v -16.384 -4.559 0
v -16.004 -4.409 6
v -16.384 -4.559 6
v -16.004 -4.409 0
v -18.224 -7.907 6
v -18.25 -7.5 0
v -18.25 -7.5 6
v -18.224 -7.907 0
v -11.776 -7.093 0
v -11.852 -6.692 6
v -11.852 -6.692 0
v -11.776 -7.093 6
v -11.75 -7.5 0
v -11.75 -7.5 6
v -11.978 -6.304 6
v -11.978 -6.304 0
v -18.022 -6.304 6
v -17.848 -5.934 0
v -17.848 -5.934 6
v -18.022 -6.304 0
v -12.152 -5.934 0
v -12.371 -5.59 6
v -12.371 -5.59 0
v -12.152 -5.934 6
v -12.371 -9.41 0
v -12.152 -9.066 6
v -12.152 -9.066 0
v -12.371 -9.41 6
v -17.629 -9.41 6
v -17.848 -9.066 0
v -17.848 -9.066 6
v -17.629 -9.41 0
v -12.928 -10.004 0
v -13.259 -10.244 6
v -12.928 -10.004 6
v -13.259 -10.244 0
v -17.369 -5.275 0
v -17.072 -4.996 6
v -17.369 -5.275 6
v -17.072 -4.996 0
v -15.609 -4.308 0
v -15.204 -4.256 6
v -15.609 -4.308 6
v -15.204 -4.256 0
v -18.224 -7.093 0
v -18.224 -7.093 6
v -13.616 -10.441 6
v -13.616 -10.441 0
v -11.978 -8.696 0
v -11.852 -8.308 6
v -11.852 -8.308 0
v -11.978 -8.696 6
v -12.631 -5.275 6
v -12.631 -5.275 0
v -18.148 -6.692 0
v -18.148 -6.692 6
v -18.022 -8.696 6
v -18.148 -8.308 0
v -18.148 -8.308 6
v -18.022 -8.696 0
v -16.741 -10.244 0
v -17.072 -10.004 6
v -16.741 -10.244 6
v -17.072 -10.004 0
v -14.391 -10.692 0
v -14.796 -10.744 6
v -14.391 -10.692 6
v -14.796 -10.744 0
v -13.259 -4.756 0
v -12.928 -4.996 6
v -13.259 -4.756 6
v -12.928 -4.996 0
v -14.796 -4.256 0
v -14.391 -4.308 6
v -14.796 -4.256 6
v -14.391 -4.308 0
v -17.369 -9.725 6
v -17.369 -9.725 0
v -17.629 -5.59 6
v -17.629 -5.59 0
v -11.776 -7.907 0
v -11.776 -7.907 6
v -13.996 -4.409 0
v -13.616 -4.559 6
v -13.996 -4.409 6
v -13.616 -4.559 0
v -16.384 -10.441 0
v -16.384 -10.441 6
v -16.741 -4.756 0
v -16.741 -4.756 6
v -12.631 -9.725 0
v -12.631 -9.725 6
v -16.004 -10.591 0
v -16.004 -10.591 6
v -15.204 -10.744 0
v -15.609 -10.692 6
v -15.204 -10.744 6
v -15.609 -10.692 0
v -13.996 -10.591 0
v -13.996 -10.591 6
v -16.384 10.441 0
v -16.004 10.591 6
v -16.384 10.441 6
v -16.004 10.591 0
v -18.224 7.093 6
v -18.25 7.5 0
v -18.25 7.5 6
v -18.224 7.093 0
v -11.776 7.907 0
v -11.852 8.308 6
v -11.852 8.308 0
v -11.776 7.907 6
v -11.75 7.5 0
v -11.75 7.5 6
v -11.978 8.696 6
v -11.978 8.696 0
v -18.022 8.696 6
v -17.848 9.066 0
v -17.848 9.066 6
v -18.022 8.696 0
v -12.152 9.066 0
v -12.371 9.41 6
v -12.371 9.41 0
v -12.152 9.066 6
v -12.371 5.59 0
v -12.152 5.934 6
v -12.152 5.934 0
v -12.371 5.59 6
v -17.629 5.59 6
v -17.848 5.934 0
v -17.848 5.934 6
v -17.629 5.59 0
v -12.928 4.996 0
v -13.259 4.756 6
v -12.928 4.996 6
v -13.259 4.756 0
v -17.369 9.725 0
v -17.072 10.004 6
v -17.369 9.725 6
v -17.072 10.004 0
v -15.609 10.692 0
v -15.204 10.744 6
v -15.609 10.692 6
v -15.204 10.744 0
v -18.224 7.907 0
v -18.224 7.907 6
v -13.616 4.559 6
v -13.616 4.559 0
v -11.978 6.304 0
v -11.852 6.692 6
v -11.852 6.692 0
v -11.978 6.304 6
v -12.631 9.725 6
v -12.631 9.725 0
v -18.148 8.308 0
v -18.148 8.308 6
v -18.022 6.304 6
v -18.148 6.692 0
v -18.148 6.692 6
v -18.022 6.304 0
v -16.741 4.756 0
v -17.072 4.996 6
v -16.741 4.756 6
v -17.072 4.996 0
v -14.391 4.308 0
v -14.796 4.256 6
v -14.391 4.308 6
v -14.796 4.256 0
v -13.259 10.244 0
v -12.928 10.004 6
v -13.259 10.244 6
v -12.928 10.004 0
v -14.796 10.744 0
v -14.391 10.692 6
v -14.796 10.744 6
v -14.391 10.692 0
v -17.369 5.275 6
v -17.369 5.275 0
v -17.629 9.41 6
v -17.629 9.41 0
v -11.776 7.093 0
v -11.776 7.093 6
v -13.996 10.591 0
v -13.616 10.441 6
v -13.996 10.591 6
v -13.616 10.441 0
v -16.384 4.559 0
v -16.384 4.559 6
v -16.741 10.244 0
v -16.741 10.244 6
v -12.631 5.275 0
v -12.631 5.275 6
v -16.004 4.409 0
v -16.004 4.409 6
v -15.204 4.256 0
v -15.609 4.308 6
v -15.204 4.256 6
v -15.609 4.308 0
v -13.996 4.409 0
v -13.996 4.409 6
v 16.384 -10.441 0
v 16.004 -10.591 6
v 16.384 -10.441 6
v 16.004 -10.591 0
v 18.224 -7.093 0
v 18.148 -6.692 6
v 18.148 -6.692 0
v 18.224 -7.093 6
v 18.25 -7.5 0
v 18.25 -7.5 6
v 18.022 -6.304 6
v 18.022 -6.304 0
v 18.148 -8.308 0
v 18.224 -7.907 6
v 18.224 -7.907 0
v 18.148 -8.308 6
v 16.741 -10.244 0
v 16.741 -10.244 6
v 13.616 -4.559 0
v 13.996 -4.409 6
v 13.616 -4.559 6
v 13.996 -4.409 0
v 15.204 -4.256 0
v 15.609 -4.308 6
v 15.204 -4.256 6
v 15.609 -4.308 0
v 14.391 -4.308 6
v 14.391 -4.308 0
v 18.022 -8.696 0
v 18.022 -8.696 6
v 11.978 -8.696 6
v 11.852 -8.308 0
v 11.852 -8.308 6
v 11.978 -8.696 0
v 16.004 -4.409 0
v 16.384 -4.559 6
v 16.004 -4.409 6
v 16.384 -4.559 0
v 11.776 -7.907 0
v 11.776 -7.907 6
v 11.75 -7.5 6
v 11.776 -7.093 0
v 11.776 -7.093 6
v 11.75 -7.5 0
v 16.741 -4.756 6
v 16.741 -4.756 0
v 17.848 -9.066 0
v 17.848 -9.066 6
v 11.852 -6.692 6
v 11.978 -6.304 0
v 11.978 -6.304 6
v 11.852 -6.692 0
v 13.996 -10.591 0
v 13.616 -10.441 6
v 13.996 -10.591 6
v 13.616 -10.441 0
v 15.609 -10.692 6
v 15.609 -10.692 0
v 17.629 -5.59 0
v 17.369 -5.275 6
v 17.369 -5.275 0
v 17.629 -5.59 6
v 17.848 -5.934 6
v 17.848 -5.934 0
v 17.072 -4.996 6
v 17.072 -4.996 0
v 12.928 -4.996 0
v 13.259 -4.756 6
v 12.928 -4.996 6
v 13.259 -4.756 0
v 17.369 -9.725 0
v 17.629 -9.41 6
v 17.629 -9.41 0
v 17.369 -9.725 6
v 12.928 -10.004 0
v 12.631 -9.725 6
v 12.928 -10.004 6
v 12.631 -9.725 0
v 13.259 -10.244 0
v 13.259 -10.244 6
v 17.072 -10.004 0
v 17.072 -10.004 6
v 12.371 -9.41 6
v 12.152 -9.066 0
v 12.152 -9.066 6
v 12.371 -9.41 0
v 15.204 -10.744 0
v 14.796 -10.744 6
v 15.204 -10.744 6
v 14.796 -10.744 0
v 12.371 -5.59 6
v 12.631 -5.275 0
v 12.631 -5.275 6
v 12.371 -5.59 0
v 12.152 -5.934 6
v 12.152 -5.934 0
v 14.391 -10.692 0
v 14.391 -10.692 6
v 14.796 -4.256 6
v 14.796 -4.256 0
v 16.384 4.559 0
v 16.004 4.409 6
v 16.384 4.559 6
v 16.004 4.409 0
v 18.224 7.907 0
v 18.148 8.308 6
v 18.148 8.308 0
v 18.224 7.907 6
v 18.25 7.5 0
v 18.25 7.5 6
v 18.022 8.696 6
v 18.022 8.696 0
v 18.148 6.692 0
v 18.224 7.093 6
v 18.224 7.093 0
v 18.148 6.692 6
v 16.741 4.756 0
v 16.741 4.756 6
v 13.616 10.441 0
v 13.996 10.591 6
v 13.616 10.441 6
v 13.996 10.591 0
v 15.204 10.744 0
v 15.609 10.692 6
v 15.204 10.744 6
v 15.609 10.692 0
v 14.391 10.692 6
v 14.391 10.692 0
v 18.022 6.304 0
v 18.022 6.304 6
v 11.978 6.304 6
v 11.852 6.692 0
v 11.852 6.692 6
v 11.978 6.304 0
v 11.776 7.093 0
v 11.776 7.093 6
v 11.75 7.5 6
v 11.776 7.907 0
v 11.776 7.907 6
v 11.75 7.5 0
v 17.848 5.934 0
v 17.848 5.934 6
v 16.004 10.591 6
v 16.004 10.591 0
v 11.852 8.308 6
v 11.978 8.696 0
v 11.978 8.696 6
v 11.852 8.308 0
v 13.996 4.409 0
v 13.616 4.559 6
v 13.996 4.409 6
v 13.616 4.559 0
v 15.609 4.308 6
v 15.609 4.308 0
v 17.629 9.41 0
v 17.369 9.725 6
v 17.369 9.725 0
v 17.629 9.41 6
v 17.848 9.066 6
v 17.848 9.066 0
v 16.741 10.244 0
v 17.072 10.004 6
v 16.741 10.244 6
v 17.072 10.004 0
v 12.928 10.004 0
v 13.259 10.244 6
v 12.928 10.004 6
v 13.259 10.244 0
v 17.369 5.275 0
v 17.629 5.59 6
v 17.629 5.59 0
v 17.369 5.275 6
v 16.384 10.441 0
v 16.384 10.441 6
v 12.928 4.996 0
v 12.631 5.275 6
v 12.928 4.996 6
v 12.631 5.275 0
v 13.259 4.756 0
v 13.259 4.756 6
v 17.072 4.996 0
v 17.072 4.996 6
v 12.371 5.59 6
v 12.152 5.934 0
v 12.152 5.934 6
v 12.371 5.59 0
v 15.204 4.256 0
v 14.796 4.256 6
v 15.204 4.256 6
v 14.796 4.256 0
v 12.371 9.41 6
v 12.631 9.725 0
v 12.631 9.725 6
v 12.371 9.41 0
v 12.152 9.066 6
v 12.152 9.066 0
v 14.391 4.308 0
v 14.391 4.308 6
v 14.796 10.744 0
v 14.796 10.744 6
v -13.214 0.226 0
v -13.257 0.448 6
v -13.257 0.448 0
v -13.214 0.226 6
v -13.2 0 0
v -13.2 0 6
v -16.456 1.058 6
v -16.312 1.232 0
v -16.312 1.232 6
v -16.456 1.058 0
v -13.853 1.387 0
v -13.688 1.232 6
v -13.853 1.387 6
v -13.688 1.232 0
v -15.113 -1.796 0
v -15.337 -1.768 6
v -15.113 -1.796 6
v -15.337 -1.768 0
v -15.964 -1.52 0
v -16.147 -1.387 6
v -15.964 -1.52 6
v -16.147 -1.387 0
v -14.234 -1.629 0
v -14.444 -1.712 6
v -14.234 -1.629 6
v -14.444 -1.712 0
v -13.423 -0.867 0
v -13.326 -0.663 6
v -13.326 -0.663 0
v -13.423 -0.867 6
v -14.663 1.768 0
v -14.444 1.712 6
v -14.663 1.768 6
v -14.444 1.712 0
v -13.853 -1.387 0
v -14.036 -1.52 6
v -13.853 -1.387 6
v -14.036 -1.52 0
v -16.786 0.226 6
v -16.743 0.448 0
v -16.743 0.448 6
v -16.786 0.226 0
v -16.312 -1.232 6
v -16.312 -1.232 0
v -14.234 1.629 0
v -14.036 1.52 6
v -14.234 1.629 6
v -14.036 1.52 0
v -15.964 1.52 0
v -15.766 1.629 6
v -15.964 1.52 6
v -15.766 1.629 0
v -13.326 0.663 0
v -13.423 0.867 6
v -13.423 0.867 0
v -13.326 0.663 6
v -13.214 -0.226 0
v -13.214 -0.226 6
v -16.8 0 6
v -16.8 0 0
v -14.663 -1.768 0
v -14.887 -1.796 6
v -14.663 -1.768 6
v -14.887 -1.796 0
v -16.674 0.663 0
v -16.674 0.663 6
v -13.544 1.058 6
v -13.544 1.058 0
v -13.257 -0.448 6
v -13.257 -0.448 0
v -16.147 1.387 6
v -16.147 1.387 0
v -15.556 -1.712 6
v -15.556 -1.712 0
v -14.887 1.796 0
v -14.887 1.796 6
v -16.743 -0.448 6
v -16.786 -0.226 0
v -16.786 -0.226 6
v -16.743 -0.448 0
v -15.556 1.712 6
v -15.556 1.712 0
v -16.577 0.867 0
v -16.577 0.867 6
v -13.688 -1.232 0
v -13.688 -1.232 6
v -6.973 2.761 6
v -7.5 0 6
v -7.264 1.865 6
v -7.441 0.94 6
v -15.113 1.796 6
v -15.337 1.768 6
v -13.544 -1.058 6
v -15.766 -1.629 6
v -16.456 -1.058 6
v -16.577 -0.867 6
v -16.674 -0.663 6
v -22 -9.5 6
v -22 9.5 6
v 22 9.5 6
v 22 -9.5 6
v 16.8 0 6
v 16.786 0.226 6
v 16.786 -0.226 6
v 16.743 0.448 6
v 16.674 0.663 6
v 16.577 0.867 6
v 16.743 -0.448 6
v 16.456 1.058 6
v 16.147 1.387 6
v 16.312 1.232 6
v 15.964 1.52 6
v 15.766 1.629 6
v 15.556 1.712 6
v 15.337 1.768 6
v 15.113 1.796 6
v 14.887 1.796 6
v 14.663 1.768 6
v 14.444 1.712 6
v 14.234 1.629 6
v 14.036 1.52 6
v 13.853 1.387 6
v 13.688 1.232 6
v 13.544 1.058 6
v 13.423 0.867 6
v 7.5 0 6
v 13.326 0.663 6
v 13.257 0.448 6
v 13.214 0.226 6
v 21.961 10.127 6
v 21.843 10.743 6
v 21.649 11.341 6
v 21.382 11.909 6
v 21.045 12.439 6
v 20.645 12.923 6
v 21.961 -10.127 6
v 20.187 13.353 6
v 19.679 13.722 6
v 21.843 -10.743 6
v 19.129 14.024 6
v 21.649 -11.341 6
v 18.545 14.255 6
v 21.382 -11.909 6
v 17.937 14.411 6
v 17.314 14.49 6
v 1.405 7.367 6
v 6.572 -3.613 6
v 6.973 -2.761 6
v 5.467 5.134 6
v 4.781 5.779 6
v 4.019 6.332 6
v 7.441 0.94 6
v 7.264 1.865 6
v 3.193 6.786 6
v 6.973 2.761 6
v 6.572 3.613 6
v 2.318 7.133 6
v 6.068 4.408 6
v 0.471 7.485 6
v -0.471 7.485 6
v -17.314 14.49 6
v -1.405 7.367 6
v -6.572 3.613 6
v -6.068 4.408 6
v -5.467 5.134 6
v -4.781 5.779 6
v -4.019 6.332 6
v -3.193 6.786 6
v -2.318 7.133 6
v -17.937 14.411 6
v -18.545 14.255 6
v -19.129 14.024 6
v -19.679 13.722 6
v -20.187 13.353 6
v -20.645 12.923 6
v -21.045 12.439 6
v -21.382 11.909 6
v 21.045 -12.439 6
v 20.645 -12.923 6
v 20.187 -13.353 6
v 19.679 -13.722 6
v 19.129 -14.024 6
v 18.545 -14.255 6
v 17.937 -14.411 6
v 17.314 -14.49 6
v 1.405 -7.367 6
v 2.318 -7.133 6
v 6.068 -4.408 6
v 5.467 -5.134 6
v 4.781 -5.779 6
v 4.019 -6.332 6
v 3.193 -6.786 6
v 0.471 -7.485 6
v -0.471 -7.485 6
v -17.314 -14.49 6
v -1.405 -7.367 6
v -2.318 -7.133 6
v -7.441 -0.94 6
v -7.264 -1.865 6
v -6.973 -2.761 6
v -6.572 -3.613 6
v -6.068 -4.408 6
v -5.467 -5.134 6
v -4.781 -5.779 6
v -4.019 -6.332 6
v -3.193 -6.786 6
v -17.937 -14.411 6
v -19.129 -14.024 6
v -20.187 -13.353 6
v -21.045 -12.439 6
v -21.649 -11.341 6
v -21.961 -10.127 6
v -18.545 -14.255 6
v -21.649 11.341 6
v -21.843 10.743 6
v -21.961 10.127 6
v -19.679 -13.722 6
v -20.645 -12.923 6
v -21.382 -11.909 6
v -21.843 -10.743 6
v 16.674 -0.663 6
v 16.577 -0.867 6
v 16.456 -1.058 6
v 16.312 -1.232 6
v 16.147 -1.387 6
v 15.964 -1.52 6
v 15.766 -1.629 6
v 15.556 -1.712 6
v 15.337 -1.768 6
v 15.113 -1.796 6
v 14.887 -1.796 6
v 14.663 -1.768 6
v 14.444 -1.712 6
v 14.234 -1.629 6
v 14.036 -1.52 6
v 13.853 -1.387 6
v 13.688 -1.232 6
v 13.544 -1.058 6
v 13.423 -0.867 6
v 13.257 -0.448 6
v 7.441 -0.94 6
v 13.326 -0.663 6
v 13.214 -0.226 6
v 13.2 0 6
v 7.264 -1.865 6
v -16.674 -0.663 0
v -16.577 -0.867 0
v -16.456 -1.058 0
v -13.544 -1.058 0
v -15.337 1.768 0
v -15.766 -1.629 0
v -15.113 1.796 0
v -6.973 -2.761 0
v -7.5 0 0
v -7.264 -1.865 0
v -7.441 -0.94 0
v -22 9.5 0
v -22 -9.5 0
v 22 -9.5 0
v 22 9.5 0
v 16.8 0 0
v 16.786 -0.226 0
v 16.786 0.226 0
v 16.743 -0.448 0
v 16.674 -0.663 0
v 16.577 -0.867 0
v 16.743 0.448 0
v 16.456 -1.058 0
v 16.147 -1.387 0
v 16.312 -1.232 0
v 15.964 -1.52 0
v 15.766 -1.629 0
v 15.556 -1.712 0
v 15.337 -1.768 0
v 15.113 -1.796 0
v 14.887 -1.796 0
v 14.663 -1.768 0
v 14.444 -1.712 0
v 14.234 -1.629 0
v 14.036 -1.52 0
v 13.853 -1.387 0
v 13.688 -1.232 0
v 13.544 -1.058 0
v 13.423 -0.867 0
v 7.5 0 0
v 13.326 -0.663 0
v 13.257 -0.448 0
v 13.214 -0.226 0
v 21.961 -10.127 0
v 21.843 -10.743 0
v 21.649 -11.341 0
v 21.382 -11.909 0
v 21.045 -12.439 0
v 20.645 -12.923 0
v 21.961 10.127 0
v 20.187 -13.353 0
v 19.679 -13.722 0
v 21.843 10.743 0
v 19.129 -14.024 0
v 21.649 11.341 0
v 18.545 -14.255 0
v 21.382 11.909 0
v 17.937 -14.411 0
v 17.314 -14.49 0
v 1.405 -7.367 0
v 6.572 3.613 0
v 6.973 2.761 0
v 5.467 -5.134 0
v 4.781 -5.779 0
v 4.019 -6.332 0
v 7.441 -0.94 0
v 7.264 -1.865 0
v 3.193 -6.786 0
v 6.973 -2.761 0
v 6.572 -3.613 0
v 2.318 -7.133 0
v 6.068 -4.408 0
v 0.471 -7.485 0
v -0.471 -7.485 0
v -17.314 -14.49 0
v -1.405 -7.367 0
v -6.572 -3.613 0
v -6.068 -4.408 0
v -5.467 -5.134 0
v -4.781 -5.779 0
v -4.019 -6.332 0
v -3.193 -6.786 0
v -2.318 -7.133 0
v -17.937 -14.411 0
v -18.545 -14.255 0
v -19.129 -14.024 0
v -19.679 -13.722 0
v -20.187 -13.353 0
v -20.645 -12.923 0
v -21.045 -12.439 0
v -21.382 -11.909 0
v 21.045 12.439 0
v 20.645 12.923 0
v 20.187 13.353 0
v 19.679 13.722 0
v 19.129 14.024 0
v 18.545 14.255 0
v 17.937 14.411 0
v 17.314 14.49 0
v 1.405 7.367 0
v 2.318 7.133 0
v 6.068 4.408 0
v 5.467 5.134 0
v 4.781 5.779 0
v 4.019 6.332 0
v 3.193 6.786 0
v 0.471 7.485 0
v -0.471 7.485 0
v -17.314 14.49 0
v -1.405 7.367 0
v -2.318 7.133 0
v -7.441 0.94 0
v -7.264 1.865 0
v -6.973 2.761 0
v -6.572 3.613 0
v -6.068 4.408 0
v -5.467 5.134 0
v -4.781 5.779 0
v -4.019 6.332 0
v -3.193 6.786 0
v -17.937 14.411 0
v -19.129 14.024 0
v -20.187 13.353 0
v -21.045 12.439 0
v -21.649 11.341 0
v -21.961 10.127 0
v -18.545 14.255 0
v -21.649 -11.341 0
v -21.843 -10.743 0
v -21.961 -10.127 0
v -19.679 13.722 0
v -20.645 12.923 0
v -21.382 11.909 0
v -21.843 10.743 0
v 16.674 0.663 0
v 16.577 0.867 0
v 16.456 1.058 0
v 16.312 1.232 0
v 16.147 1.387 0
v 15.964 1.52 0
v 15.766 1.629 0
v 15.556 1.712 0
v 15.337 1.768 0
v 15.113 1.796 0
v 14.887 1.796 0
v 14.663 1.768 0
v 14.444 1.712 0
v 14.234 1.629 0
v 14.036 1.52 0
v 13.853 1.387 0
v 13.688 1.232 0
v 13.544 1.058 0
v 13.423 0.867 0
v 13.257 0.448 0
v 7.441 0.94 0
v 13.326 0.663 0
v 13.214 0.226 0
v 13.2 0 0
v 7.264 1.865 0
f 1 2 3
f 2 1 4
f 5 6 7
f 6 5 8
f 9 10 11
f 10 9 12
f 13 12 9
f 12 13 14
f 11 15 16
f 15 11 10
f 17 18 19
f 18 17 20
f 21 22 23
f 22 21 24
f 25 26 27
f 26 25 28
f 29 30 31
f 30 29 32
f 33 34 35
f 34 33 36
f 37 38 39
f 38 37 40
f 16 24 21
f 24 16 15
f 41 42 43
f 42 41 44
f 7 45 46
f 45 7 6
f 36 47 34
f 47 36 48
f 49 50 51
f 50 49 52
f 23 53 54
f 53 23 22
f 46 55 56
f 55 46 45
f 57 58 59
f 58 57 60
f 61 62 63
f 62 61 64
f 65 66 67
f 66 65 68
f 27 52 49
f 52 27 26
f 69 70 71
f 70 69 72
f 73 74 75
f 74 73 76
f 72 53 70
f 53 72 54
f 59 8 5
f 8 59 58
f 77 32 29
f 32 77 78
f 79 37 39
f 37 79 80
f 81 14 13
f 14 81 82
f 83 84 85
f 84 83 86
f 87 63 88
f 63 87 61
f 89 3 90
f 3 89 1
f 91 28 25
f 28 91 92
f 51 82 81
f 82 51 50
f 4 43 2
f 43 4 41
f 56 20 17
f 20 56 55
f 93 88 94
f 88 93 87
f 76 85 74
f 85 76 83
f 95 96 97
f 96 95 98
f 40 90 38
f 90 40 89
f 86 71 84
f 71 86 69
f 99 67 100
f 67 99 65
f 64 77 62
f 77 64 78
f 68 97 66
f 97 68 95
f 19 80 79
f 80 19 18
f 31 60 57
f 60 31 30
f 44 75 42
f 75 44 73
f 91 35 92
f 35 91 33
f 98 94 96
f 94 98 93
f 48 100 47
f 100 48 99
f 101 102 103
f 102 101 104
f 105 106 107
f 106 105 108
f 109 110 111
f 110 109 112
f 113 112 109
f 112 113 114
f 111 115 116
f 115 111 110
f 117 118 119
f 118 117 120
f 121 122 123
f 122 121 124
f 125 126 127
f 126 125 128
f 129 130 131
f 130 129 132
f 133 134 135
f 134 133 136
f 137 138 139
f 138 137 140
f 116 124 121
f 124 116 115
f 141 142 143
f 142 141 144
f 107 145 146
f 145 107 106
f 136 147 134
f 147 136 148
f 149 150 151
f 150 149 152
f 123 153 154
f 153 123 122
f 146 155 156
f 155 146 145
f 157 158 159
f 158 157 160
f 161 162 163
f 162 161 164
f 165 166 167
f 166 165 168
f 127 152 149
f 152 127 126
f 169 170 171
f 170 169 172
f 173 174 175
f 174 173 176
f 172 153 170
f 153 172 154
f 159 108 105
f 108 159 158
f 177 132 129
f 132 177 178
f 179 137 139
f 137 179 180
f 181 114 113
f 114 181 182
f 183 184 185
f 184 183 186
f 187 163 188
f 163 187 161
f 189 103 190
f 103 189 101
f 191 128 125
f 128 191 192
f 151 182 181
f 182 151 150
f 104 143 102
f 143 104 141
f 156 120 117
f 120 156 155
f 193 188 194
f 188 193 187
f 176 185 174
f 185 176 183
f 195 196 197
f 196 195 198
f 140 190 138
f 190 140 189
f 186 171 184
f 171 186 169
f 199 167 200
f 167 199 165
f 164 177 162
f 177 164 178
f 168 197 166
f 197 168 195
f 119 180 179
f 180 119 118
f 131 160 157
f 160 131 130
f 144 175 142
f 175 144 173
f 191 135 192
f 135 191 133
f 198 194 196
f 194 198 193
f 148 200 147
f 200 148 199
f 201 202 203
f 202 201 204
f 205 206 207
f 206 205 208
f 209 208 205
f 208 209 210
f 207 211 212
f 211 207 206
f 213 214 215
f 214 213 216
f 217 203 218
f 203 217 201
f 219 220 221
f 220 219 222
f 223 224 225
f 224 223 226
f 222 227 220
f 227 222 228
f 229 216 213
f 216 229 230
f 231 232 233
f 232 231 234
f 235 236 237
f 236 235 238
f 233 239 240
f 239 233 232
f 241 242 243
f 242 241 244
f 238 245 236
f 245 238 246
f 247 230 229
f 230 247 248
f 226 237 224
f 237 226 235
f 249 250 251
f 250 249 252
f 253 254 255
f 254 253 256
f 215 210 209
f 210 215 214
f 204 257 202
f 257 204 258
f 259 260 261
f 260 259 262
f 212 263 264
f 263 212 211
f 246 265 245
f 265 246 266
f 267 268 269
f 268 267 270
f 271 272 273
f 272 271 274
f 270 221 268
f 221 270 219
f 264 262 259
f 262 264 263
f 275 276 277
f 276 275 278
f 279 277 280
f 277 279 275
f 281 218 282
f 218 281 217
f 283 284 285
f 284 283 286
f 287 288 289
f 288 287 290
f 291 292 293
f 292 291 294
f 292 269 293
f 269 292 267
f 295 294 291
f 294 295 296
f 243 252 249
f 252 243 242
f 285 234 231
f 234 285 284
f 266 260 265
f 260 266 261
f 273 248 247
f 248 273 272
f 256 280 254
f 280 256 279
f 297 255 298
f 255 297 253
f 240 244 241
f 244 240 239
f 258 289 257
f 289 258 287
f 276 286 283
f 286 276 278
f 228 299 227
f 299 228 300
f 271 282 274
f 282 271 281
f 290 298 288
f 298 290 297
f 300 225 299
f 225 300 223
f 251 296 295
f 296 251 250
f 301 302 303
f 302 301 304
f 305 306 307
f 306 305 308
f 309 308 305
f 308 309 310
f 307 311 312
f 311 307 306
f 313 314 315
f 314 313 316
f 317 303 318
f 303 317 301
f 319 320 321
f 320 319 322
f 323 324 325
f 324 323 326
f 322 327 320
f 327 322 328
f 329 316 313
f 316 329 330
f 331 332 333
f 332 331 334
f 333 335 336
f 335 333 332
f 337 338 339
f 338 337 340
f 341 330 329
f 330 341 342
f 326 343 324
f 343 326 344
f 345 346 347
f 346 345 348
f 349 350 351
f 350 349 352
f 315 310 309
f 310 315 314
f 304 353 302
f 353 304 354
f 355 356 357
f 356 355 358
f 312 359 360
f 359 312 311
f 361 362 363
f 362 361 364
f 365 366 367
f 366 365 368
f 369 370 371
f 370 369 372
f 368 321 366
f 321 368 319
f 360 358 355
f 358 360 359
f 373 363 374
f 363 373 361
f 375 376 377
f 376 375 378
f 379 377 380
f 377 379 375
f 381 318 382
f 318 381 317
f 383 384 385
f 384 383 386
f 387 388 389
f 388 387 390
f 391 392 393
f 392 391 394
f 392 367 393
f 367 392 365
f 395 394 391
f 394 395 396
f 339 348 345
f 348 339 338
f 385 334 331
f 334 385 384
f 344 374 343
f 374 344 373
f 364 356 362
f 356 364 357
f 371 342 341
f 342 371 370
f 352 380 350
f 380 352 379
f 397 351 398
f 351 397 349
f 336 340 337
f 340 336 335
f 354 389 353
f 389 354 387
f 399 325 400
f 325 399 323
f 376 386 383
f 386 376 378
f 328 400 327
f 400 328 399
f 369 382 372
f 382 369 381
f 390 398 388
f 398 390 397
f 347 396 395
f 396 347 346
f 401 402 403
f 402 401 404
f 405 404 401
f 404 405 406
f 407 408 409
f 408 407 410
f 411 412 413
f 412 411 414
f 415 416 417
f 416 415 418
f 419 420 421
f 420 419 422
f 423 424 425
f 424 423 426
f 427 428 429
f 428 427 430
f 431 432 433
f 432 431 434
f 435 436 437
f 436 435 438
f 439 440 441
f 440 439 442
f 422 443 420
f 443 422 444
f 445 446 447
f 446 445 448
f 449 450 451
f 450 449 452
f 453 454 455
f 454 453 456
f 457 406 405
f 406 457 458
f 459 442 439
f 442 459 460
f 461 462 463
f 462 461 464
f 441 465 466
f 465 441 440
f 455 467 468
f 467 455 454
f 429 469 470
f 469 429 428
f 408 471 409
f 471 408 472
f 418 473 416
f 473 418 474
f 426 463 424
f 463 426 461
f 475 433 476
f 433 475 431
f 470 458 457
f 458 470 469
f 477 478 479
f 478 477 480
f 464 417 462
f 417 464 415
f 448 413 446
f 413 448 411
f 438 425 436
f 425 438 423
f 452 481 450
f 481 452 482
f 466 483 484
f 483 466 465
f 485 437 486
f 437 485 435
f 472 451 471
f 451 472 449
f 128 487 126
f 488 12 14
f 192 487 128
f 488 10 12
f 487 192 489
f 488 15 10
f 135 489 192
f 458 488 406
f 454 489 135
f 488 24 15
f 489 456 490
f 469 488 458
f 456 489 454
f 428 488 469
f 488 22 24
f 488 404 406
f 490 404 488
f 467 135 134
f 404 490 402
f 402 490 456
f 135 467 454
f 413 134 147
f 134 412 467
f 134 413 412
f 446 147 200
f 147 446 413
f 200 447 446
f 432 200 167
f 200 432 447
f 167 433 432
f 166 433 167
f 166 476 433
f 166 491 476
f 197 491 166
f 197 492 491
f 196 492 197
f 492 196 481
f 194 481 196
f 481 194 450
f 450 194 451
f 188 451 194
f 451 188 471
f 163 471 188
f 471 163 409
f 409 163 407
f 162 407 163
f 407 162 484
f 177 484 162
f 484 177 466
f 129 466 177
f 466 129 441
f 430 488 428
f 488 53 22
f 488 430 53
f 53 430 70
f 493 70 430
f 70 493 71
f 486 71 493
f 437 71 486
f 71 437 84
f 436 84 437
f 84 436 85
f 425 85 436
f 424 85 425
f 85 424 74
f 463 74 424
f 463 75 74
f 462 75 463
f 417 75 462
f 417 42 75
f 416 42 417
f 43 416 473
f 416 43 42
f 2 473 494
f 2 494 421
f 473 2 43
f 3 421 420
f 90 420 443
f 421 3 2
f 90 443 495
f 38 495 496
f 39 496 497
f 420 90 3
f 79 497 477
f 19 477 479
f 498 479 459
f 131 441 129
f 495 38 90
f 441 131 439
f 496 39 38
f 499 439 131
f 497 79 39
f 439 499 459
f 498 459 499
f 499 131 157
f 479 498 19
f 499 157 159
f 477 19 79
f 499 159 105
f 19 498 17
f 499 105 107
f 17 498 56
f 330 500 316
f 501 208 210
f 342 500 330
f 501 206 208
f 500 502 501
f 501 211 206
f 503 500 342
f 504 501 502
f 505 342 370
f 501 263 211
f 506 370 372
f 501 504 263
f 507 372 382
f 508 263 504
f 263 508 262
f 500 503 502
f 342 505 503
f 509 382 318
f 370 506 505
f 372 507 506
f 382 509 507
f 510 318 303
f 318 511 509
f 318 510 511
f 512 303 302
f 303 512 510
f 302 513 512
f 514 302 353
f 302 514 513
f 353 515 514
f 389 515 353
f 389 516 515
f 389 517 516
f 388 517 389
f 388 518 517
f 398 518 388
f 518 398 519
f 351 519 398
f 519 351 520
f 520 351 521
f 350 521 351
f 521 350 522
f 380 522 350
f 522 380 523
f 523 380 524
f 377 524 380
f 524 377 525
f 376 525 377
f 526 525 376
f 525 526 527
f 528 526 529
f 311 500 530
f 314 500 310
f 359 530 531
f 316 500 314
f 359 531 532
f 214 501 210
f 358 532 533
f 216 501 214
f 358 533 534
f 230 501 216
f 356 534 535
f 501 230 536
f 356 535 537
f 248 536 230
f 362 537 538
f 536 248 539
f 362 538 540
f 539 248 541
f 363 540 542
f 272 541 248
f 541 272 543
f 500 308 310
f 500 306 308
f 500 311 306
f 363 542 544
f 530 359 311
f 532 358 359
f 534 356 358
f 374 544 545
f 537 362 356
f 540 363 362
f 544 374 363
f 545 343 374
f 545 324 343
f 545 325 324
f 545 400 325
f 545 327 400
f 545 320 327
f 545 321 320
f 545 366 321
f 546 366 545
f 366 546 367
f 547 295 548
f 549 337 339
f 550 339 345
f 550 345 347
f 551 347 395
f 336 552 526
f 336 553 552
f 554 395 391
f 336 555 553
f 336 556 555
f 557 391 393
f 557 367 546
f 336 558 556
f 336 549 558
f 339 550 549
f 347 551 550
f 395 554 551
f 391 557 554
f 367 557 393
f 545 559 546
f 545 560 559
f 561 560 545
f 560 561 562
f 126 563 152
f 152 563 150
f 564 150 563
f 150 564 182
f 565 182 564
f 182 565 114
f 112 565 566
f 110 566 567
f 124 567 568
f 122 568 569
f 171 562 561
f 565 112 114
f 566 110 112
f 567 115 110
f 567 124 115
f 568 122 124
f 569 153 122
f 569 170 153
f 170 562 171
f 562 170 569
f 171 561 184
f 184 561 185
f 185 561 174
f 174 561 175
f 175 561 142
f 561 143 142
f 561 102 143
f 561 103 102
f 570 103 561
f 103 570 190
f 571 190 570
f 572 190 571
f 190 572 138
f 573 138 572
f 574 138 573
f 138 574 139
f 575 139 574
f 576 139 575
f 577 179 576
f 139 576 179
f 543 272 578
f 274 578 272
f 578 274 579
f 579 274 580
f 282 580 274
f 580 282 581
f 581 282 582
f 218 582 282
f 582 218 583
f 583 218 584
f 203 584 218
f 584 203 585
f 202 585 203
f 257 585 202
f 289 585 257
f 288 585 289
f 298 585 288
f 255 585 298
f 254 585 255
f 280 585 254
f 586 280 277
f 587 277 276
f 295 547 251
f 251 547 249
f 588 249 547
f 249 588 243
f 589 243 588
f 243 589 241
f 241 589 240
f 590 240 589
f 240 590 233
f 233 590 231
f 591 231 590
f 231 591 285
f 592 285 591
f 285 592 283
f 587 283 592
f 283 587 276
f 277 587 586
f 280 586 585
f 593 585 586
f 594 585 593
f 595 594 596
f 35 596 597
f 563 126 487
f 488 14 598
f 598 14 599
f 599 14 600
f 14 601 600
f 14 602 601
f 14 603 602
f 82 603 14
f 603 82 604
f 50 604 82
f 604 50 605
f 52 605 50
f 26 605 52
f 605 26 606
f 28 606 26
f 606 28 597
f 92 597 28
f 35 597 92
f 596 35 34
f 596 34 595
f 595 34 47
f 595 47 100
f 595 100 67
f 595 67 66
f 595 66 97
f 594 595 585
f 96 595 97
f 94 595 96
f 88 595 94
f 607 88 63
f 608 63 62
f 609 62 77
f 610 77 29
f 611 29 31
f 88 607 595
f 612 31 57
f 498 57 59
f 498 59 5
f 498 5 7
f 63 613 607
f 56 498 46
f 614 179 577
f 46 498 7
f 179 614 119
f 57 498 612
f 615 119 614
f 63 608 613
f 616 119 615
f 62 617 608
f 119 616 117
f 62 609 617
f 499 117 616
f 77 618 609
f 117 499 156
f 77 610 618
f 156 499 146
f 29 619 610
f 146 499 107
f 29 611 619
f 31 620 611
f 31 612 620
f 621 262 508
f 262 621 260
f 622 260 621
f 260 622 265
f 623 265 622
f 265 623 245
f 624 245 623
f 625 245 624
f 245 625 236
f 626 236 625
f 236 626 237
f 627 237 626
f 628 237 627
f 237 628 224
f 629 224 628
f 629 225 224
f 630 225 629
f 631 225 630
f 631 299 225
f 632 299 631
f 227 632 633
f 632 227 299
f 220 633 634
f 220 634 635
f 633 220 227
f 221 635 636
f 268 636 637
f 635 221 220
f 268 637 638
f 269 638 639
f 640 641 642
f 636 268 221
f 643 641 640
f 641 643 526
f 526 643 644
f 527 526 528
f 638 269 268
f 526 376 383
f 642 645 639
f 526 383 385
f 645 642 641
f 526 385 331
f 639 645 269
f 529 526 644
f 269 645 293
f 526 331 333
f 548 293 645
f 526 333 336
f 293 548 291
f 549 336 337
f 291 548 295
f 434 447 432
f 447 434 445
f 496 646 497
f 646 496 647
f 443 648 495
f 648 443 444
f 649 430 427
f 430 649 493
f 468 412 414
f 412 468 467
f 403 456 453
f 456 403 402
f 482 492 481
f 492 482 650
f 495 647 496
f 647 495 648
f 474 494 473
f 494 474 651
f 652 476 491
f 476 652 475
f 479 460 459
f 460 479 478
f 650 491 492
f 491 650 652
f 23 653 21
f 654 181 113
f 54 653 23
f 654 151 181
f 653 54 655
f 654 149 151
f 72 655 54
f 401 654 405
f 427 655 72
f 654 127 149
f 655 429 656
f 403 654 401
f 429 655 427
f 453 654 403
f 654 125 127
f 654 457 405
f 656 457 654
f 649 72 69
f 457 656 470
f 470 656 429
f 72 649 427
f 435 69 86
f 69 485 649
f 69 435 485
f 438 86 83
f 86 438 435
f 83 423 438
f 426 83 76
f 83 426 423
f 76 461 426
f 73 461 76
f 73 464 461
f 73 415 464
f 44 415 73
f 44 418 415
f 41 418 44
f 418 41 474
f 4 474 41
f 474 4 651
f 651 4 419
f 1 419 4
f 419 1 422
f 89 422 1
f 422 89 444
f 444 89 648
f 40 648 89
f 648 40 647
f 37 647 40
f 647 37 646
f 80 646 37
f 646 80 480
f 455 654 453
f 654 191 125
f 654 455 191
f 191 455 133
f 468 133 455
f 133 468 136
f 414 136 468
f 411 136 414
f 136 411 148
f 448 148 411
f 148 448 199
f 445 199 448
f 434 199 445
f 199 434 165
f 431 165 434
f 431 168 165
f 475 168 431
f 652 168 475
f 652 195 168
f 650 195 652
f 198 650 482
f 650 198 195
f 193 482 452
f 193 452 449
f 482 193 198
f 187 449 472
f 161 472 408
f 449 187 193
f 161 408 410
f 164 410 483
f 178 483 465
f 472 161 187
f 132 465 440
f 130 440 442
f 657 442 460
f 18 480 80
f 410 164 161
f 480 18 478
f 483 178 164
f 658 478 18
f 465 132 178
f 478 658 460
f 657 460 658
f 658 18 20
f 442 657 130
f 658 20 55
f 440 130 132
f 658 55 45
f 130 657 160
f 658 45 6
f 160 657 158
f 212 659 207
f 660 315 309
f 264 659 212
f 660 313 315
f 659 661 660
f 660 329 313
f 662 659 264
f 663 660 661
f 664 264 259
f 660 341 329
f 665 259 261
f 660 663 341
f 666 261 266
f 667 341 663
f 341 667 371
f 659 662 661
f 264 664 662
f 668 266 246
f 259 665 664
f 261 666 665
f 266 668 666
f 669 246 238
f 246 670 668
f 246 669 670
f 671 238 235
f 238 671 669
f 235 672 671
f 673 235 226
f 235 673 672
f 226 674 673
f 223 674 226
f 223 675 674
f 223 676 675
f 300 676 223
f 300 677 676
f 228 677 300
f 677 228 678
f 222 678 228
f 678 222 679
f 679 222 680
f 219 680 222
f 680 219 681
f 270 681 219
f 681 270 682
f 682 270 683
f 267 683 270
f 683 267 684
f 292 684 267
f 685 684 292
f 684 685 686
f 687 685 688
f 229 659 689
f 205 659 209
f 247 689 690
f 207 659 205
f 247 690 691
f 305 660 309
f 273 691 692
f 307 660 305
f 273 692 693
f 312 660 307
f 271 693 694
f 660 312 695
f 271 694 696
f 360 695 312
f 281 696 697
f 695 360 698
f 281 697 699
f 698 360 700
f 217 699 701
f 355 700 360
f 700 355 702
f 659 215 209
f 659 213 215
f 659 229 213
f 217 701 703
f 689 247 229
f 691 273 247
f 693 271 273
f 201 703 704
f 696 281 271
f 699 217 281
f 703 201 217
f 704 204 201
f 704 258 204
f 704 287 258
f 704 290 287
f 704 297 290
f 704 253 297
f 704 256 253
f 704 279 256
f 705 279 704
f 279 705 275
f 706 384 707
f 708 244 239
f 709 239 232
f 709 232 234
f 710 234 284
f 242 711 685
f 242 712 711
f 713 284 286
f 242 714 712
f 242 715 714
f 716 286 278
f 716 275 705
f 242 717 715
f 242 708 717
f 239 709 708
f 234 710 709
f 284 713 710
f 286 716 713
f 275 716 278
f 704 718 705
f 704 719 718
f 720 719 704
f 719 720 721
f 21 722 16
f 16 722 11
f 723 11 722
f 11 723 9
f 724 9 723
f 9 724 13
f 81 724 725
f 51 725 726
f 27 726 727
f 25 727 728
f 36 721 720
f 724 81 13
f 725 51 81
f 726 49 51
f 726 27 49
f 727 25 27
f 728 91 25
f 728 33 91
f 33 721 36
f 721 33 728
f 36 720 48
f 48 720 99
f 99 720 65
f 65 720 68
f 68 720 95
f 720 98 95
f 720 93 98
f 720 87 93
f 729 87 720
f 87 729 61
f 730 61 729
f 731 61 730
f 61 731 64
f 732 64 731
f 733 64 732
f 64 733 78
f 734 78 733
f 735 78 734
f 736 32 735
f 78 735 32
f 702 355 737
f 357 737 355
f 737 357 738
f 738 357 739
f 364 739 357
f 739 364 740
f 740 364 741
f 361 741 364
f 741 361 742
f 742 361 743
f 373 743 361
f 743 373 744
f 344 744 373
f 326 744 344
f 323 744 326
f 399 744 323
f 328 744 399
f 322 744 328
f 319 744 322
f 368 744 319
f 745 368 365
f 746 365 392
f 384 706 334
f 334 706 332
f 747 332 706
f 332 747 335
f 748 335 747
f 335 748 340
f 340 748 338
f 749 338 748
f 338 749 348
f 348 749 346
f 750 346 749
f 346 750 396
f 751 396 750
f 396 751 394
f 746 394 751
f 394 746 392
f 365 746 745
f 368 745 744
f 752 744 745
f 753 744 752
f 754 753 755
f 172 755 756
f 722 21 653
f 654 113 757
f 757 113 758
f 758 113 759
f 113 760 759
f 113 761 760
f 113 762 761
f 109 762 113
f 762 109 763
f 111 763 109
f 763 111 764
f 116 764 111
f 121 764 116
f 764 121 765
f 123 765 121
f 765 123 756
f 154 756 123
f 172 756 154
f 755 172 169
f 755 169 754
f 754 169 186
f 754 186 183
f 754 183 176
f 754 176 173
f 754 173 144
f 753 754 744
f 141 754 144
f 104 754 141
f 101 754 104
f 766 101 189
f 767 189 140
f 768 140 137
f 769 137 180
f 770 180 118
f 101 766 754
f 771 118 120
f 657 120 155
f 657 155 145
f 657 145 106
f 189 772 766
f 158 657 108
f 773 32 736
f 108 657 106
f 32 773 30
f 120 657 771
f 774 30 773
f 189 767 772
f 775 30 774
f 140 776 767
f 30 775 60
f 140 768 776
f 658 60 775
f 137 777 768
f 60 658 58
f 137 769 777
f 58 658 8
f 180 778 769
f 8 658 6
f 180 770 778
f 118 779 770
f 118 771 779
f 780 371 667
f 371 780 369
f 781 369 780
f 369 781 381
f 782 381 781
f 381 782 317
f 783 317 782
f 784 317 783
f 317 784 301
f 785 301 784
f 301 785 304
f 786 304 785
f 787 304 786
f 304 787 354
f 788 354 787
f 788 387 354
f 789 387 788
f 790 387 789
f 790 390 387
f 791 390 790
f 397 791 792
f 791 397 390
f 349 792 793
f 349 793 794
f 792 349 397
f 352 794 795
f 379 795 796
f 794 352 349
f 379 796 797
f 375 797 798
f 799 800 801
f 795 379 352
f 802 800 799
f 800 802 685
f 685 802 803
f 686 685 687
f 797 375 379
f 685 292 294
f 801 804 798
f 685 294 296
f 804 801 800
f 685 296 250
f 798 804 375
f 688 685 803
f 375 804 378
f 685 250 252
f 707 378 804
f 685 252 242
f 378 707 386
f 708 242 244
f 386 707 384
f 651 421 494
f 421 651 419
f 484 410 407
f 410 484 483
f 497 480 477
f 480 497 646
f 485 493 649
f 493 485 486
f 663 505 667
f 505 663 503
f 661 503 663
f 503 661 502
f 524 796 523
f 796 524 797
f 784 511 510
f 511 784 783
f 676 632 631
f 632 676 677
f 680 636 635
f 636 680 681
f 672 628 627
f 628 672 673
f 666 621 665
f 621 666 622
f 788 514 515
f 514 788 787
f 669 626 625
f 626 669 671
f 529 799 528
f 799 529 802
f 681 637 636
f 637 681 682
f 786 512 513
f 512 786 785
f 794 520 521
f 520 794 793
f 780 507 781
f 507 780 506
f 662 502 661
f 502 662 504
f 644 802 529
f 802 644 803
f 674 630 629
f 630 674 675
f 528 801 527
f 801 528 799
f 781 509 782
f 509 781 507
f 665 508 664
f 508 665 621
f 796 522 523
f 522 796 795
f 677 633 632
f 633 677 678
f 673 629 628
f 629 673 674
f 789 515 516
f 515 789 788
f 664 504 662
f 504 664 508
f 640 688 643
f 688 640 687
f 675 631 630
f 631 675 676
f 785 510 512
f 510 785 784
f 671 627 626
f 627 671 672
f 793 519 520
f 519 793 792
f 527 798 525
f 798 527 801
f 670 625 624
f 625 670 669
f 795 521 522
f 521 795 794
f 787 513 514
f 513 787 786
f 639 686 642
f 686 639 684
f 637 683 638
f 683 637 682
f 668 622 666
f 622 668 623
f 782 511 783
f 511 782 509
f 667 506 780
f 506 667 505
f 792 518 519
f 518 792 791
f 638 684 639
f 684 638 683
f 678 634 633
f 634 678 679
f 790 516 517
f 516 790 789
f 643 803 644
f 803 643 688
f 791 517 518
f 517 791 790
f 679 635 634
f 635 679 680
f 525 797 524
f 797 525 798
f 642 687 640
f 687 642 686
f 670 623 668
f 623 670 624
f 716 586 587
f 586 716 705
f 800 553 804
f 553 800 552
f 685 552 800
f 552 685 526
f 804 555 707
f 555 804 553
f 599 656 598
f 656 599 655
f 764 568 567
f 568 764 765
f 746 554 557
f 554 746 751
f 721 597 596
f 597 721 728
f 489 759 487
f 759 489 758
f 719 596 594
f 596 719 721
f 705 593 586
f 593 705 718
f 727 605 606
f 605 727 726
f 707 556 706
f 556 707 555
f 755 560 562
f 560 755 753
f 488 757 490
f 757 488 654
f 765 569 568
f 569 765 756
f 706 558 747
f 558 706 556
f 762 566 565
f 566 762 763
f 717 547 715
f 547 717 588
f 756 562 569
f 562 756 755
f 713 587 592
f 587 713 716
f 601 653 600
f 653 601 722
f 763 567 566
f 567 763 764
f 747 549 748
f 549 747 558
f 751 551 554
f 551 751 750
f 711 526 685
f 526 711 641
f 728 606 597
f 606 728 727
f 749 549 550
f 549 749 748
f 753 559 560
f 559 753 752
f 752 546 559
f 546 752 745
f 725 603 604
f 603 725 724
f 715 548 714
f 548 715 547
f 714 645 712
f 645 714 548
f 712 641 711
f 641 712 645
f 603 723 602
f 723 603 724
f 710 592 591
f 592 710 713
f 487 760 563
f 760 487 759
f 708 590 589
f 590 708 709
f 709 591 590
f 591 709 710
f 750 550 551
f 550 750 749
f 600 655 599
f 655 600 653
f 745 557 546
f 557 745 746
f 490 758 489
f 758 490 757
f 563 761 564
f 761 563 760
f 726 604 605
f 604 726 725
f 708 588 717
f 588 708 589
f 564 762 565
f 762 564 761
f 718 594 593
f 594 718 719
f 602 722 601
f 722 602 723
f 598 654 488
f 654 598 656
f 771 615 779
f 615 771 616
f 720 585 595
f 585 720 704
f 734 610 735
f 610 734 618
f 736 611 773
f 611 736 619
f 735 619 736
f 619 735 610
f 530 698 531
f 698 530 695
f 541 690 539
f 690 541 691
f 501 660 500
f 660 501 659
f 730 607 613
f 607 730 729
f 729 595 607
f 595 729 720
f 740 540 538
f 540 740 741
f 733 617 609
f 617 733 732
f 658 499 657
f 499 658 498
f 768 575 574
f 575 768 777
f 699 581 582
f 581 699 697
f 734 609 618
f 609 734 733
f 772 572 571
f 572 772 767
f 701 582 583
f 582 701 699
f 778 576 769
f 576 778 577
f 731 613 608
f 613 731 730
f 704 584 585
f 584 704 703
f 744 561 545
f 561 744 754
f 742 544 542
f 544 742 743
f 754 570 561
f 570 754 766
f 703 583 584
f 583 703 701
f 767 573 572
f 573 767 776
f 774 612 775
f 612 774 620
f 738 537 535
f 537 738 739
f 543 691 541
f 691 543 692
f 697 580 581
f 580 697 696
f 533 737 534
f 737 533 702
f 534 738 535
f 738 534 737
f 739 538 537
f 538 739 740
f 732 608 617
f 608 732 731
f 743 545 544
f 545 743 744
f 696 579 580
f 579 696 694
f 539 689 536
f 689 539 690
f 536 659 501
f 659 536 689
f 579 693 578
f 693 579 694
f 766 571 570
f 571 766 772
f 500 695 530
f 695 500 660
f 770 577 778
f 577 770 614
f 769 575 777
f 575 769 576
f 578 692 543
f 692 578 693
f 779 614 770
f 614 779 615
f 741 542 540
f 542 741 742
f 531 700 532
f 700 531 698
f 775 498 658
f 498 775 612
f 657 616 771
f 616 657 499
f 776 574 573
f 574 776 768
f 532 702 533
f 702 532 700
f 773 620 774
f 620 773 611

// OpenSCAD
$fn = 50;


difference() {
	union() {
		hull() {
			translate(v = [-17.0000000000, 9.5000000000, 0]) {
				cylinder(h = 6, r = 5);
			}
			translate(v = [17.0000000000, 9.5000000000, 0]) {
				cylinder(h = 6, r = 5);
			}
			translate(v = [-17.0000000000, -9.5000000000, 0]) {
				cylinder(h = 6, r = 5);
			}
			translate(v = [17.0000000000, -9.5000000000, 0]) {
				cylinder(h = 6, r = 5);
			}
		}
	}
	union() {
		#translate(v = [-15.0000000000, -7.5000000000, 0]) {
			cylinder(h = 6, r = 3.2500000000);
		}
		#translate(v = [-15.0000000000, 7.5000000000, 0]) {
			cylinder(h = 6, r = 3.2500000000);
		}
		#translate(v = [15.0000000000, -7.5000000000, 0]) {
			cylinder(h = 6, r = 3.2500000000);
		}
		#translate(v = [15.0000000000, 7.5000000000, 0]) {
			cylinder(h = 6, r = 3.2500000000);
		}
		#translate(v = [-15.0000000000, -7.5000000000, -100.0000000000]) {
			cylinder(h = 200, r = 3.2500000000);
		}
		#translate(v = [-15.0000000000, 7.5000000000, -100.0000000000]) {
			cylinder(h = 200, r = 3.2500000000);
		}
		#translate(v = [15.0000000000, -7.5000000000, -100.0000000000]) {
			cylinder(h = 200, r = 3.2500000000);
		}
		#translate(v = [15.0000000000, 7.5000000000, -100.0000000000]) {
			cylinder(h = 200, r = 3.2500000000);
		}
		#translate(v = [-15.0000000000, -7.5000000000, 0]) {
			cylinder(h = 6, r = 1.8000000000);
		}
		#translate(v = [-15.0000000000, 0.0000000000, 0]) {
			cylinder(h = 6, r = 1.8000000000);
		}
		#translate(v = [-15.0000000000, 7.5000000000, 0]) {
			cylinder(h = 6, r = 1.8000000000);
		}
		#translate(v = [15.0000000000, -7.5000000000, 0]) {
			cylinder(h = 6, r = 1.8000000000);
		}
		#translate(v = [15.0000000000, 0.0000000000, 0]) {
			cylinder(h = 6, r = 1.8000000000);
		}
		#translate(v = [15.0000000000, 7.5000000000, 0]) {
			cylinder(h = 6, r = 1.8000000000);
		}
		#translate(v = [-15.0000000000, -7.5000000000, 0]) {
			cylinder(h = 6, r = 1.8000000000);
		}
		#translate(v = [-15.0000000000, 0.0000000000, 0]) {
			cylinder(h = 6, r = 1.8000000000);
		}
		#translate(v = [-15.0000000000, 7.5000000000, 0]) {
			cylinder(h = 6, r = 1.8000000000);
		}
		#translate(v = [15.0000000000, -7.5000000000, 0]) {
			cylinder(h = 6, r = 1.8000000000);
		}
		#translate(v = [15.0000000000, 0.0000000000, 0]) {
			cylinder(h = 6, r = 1.8000000000);
		}
		#translate(v = [15.0000000000, 7.5000000000, 0]) {
			cylinder(h = 6, r = 1.8000000000);
		}
		#translate(v = [-15.0000000000, -7.5000000000, 0]) {
			cylinder(h = 6, r = 1.8000000000);
		}
		#translate(v = [-15.0000000000, 0.0000000000, 0]) {
			cylinder(h = 6, r = 1.8000000000);
		}
		#translate(v = [-15.0000000000, 7.5000000000, 0]) {
			cylinder(h = 6, r = 1.8000000000);
		}
		#translate(v = [15.0000000000, -7.5000000000, 0]) {
			cylinder(h = 6, r = 1.8000000000);
		}
		#translate(v = [15.0000000000, 0.0000000000, 0]) {
			cylinder(h = 6, r = 1.8000000000);
		}
		#translate(v = [15.0000000000, 7.5000000000, 0]) {
			cylinder(h = 6, r = 1.8000000000);
		}
		#cylinder(h = 6, r = 7.5000000000);
	}
}
